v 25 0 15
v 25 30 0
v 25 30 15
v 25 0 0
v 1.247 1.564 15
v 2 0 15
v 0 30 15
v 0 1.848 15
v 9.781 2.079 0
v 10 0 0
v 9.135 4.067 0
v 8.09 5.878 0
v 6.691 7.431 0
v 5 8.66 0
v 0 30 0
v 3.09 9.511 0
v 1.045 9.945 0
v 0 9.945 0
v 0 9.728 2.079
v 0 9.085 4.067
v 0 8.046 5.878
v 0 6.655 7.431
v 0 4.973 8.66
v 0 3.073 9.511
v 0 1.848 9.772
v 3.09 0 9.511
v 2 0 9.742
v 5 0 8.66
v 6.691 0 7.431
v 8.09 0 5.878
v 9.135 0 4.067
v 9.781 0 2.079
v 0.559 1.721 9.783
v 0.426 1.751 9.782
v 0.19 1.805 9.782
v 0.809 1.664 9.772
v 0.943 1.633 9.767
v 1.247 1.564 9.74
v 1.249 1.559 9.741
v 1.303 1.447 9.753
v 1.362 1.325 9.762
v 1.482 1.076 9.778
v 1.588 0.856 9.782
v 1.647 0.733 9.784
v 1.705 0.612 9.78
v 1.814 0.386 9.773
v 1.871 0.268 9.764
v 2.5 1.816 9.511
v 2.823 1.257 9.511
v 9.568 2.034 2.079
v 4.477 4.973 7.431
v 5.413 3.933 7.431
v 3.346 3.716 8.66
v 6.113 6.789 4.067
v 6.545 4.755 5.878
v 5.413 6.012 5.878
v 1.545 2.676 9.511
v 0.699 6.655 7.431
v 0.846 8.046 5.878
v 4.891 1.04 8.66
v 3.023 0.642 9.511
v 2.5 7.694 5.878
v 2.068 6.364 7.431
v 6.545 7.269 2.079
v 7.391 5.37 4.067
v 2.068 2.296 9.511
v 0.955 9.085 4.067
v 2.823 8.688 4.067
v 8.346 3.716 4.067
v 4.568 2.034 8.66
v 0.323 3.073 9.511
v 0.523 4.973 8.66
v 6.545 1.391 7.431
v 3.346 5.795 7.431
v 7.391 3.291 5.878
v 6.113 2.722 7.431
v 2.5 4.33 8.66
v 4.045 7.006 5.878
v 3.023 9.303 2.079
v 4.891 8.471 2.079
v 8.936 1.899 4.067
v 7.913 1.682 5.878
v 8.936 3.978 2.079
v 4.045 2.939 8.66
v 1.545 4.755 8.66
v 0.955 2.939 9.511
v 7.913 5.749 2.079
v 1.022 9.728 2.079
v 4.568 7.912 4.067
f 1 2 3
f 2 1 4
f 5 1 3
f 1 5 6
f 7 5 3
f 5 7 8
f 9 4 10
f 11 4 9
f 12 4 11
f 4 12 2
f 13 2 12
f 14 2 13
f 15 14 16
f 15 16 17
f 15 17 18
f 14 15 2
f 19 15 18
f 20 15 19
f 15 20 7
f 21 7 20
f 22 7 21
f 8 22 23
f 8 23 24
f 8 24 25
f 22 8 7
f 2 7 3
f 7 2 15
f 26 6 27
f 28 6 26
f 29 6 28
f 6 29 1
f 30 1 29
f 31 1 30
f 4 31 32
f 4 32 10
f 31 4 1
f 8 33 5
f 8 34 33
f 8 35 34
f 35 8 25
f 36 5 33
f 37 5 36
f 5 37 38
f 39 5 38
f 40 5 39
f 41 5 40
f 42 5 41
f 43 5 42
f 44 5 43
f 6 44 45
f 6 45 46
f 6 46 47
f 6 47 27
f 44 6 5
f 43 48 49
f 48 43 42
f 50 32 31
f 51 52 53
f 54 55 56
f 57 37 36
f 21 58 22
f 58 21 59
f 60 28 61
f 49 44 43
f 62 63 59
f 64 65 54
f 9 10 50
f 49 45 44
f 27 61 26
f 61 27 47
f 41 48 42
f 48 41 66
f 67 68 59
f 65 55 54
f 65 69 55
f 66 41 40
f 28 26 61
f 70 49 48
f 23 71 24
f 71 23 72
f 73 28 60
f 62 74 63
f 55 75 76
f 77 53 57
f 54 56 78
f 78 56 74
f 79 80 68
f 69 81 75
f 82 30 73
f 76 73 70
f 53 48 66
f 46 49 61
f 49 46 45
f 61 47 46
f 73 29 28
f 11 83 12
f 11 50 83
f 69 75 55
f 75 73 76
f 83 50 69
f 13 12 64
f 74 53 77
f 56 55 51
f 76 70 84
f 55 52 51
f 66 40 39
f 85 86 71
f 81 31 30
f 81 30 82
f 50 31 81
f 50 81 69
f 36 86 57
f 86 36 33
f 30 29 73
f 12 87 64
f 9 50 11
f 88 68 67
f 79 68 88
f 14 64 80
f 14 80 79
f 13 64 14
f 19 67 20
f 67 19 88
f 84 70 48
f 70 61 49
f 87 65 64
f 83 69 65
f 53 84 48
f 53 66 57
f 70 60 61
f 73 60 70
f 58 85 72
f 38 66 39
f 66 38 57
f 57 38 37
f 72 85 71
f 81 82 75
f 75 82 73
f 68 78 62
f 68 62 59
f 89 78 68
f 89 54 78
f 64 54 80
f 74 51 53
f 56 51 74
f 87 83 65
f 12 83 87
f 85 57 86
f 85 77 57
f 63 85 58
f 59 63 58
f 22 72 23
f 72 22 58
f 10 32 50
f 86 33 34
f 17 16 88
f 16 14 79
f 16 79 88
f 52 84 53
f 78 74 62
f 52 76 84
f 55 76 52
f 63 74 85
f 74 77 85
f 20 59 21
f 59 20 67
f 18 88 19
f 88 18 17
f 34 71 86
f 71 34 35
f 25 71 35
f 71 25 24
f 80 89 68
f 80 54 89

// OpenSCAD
// Generated by generate_scads.py
difference() {
  union() {
    cube(size=[25,30,15], center=false);
    cylinder(h=20, r=2, center=false);
  }
  sphere(r=10);
  translate([10,-10,30]) {
    sphere(r=4);
  }
  cylinder(h=20, r=2, center=false);
}
